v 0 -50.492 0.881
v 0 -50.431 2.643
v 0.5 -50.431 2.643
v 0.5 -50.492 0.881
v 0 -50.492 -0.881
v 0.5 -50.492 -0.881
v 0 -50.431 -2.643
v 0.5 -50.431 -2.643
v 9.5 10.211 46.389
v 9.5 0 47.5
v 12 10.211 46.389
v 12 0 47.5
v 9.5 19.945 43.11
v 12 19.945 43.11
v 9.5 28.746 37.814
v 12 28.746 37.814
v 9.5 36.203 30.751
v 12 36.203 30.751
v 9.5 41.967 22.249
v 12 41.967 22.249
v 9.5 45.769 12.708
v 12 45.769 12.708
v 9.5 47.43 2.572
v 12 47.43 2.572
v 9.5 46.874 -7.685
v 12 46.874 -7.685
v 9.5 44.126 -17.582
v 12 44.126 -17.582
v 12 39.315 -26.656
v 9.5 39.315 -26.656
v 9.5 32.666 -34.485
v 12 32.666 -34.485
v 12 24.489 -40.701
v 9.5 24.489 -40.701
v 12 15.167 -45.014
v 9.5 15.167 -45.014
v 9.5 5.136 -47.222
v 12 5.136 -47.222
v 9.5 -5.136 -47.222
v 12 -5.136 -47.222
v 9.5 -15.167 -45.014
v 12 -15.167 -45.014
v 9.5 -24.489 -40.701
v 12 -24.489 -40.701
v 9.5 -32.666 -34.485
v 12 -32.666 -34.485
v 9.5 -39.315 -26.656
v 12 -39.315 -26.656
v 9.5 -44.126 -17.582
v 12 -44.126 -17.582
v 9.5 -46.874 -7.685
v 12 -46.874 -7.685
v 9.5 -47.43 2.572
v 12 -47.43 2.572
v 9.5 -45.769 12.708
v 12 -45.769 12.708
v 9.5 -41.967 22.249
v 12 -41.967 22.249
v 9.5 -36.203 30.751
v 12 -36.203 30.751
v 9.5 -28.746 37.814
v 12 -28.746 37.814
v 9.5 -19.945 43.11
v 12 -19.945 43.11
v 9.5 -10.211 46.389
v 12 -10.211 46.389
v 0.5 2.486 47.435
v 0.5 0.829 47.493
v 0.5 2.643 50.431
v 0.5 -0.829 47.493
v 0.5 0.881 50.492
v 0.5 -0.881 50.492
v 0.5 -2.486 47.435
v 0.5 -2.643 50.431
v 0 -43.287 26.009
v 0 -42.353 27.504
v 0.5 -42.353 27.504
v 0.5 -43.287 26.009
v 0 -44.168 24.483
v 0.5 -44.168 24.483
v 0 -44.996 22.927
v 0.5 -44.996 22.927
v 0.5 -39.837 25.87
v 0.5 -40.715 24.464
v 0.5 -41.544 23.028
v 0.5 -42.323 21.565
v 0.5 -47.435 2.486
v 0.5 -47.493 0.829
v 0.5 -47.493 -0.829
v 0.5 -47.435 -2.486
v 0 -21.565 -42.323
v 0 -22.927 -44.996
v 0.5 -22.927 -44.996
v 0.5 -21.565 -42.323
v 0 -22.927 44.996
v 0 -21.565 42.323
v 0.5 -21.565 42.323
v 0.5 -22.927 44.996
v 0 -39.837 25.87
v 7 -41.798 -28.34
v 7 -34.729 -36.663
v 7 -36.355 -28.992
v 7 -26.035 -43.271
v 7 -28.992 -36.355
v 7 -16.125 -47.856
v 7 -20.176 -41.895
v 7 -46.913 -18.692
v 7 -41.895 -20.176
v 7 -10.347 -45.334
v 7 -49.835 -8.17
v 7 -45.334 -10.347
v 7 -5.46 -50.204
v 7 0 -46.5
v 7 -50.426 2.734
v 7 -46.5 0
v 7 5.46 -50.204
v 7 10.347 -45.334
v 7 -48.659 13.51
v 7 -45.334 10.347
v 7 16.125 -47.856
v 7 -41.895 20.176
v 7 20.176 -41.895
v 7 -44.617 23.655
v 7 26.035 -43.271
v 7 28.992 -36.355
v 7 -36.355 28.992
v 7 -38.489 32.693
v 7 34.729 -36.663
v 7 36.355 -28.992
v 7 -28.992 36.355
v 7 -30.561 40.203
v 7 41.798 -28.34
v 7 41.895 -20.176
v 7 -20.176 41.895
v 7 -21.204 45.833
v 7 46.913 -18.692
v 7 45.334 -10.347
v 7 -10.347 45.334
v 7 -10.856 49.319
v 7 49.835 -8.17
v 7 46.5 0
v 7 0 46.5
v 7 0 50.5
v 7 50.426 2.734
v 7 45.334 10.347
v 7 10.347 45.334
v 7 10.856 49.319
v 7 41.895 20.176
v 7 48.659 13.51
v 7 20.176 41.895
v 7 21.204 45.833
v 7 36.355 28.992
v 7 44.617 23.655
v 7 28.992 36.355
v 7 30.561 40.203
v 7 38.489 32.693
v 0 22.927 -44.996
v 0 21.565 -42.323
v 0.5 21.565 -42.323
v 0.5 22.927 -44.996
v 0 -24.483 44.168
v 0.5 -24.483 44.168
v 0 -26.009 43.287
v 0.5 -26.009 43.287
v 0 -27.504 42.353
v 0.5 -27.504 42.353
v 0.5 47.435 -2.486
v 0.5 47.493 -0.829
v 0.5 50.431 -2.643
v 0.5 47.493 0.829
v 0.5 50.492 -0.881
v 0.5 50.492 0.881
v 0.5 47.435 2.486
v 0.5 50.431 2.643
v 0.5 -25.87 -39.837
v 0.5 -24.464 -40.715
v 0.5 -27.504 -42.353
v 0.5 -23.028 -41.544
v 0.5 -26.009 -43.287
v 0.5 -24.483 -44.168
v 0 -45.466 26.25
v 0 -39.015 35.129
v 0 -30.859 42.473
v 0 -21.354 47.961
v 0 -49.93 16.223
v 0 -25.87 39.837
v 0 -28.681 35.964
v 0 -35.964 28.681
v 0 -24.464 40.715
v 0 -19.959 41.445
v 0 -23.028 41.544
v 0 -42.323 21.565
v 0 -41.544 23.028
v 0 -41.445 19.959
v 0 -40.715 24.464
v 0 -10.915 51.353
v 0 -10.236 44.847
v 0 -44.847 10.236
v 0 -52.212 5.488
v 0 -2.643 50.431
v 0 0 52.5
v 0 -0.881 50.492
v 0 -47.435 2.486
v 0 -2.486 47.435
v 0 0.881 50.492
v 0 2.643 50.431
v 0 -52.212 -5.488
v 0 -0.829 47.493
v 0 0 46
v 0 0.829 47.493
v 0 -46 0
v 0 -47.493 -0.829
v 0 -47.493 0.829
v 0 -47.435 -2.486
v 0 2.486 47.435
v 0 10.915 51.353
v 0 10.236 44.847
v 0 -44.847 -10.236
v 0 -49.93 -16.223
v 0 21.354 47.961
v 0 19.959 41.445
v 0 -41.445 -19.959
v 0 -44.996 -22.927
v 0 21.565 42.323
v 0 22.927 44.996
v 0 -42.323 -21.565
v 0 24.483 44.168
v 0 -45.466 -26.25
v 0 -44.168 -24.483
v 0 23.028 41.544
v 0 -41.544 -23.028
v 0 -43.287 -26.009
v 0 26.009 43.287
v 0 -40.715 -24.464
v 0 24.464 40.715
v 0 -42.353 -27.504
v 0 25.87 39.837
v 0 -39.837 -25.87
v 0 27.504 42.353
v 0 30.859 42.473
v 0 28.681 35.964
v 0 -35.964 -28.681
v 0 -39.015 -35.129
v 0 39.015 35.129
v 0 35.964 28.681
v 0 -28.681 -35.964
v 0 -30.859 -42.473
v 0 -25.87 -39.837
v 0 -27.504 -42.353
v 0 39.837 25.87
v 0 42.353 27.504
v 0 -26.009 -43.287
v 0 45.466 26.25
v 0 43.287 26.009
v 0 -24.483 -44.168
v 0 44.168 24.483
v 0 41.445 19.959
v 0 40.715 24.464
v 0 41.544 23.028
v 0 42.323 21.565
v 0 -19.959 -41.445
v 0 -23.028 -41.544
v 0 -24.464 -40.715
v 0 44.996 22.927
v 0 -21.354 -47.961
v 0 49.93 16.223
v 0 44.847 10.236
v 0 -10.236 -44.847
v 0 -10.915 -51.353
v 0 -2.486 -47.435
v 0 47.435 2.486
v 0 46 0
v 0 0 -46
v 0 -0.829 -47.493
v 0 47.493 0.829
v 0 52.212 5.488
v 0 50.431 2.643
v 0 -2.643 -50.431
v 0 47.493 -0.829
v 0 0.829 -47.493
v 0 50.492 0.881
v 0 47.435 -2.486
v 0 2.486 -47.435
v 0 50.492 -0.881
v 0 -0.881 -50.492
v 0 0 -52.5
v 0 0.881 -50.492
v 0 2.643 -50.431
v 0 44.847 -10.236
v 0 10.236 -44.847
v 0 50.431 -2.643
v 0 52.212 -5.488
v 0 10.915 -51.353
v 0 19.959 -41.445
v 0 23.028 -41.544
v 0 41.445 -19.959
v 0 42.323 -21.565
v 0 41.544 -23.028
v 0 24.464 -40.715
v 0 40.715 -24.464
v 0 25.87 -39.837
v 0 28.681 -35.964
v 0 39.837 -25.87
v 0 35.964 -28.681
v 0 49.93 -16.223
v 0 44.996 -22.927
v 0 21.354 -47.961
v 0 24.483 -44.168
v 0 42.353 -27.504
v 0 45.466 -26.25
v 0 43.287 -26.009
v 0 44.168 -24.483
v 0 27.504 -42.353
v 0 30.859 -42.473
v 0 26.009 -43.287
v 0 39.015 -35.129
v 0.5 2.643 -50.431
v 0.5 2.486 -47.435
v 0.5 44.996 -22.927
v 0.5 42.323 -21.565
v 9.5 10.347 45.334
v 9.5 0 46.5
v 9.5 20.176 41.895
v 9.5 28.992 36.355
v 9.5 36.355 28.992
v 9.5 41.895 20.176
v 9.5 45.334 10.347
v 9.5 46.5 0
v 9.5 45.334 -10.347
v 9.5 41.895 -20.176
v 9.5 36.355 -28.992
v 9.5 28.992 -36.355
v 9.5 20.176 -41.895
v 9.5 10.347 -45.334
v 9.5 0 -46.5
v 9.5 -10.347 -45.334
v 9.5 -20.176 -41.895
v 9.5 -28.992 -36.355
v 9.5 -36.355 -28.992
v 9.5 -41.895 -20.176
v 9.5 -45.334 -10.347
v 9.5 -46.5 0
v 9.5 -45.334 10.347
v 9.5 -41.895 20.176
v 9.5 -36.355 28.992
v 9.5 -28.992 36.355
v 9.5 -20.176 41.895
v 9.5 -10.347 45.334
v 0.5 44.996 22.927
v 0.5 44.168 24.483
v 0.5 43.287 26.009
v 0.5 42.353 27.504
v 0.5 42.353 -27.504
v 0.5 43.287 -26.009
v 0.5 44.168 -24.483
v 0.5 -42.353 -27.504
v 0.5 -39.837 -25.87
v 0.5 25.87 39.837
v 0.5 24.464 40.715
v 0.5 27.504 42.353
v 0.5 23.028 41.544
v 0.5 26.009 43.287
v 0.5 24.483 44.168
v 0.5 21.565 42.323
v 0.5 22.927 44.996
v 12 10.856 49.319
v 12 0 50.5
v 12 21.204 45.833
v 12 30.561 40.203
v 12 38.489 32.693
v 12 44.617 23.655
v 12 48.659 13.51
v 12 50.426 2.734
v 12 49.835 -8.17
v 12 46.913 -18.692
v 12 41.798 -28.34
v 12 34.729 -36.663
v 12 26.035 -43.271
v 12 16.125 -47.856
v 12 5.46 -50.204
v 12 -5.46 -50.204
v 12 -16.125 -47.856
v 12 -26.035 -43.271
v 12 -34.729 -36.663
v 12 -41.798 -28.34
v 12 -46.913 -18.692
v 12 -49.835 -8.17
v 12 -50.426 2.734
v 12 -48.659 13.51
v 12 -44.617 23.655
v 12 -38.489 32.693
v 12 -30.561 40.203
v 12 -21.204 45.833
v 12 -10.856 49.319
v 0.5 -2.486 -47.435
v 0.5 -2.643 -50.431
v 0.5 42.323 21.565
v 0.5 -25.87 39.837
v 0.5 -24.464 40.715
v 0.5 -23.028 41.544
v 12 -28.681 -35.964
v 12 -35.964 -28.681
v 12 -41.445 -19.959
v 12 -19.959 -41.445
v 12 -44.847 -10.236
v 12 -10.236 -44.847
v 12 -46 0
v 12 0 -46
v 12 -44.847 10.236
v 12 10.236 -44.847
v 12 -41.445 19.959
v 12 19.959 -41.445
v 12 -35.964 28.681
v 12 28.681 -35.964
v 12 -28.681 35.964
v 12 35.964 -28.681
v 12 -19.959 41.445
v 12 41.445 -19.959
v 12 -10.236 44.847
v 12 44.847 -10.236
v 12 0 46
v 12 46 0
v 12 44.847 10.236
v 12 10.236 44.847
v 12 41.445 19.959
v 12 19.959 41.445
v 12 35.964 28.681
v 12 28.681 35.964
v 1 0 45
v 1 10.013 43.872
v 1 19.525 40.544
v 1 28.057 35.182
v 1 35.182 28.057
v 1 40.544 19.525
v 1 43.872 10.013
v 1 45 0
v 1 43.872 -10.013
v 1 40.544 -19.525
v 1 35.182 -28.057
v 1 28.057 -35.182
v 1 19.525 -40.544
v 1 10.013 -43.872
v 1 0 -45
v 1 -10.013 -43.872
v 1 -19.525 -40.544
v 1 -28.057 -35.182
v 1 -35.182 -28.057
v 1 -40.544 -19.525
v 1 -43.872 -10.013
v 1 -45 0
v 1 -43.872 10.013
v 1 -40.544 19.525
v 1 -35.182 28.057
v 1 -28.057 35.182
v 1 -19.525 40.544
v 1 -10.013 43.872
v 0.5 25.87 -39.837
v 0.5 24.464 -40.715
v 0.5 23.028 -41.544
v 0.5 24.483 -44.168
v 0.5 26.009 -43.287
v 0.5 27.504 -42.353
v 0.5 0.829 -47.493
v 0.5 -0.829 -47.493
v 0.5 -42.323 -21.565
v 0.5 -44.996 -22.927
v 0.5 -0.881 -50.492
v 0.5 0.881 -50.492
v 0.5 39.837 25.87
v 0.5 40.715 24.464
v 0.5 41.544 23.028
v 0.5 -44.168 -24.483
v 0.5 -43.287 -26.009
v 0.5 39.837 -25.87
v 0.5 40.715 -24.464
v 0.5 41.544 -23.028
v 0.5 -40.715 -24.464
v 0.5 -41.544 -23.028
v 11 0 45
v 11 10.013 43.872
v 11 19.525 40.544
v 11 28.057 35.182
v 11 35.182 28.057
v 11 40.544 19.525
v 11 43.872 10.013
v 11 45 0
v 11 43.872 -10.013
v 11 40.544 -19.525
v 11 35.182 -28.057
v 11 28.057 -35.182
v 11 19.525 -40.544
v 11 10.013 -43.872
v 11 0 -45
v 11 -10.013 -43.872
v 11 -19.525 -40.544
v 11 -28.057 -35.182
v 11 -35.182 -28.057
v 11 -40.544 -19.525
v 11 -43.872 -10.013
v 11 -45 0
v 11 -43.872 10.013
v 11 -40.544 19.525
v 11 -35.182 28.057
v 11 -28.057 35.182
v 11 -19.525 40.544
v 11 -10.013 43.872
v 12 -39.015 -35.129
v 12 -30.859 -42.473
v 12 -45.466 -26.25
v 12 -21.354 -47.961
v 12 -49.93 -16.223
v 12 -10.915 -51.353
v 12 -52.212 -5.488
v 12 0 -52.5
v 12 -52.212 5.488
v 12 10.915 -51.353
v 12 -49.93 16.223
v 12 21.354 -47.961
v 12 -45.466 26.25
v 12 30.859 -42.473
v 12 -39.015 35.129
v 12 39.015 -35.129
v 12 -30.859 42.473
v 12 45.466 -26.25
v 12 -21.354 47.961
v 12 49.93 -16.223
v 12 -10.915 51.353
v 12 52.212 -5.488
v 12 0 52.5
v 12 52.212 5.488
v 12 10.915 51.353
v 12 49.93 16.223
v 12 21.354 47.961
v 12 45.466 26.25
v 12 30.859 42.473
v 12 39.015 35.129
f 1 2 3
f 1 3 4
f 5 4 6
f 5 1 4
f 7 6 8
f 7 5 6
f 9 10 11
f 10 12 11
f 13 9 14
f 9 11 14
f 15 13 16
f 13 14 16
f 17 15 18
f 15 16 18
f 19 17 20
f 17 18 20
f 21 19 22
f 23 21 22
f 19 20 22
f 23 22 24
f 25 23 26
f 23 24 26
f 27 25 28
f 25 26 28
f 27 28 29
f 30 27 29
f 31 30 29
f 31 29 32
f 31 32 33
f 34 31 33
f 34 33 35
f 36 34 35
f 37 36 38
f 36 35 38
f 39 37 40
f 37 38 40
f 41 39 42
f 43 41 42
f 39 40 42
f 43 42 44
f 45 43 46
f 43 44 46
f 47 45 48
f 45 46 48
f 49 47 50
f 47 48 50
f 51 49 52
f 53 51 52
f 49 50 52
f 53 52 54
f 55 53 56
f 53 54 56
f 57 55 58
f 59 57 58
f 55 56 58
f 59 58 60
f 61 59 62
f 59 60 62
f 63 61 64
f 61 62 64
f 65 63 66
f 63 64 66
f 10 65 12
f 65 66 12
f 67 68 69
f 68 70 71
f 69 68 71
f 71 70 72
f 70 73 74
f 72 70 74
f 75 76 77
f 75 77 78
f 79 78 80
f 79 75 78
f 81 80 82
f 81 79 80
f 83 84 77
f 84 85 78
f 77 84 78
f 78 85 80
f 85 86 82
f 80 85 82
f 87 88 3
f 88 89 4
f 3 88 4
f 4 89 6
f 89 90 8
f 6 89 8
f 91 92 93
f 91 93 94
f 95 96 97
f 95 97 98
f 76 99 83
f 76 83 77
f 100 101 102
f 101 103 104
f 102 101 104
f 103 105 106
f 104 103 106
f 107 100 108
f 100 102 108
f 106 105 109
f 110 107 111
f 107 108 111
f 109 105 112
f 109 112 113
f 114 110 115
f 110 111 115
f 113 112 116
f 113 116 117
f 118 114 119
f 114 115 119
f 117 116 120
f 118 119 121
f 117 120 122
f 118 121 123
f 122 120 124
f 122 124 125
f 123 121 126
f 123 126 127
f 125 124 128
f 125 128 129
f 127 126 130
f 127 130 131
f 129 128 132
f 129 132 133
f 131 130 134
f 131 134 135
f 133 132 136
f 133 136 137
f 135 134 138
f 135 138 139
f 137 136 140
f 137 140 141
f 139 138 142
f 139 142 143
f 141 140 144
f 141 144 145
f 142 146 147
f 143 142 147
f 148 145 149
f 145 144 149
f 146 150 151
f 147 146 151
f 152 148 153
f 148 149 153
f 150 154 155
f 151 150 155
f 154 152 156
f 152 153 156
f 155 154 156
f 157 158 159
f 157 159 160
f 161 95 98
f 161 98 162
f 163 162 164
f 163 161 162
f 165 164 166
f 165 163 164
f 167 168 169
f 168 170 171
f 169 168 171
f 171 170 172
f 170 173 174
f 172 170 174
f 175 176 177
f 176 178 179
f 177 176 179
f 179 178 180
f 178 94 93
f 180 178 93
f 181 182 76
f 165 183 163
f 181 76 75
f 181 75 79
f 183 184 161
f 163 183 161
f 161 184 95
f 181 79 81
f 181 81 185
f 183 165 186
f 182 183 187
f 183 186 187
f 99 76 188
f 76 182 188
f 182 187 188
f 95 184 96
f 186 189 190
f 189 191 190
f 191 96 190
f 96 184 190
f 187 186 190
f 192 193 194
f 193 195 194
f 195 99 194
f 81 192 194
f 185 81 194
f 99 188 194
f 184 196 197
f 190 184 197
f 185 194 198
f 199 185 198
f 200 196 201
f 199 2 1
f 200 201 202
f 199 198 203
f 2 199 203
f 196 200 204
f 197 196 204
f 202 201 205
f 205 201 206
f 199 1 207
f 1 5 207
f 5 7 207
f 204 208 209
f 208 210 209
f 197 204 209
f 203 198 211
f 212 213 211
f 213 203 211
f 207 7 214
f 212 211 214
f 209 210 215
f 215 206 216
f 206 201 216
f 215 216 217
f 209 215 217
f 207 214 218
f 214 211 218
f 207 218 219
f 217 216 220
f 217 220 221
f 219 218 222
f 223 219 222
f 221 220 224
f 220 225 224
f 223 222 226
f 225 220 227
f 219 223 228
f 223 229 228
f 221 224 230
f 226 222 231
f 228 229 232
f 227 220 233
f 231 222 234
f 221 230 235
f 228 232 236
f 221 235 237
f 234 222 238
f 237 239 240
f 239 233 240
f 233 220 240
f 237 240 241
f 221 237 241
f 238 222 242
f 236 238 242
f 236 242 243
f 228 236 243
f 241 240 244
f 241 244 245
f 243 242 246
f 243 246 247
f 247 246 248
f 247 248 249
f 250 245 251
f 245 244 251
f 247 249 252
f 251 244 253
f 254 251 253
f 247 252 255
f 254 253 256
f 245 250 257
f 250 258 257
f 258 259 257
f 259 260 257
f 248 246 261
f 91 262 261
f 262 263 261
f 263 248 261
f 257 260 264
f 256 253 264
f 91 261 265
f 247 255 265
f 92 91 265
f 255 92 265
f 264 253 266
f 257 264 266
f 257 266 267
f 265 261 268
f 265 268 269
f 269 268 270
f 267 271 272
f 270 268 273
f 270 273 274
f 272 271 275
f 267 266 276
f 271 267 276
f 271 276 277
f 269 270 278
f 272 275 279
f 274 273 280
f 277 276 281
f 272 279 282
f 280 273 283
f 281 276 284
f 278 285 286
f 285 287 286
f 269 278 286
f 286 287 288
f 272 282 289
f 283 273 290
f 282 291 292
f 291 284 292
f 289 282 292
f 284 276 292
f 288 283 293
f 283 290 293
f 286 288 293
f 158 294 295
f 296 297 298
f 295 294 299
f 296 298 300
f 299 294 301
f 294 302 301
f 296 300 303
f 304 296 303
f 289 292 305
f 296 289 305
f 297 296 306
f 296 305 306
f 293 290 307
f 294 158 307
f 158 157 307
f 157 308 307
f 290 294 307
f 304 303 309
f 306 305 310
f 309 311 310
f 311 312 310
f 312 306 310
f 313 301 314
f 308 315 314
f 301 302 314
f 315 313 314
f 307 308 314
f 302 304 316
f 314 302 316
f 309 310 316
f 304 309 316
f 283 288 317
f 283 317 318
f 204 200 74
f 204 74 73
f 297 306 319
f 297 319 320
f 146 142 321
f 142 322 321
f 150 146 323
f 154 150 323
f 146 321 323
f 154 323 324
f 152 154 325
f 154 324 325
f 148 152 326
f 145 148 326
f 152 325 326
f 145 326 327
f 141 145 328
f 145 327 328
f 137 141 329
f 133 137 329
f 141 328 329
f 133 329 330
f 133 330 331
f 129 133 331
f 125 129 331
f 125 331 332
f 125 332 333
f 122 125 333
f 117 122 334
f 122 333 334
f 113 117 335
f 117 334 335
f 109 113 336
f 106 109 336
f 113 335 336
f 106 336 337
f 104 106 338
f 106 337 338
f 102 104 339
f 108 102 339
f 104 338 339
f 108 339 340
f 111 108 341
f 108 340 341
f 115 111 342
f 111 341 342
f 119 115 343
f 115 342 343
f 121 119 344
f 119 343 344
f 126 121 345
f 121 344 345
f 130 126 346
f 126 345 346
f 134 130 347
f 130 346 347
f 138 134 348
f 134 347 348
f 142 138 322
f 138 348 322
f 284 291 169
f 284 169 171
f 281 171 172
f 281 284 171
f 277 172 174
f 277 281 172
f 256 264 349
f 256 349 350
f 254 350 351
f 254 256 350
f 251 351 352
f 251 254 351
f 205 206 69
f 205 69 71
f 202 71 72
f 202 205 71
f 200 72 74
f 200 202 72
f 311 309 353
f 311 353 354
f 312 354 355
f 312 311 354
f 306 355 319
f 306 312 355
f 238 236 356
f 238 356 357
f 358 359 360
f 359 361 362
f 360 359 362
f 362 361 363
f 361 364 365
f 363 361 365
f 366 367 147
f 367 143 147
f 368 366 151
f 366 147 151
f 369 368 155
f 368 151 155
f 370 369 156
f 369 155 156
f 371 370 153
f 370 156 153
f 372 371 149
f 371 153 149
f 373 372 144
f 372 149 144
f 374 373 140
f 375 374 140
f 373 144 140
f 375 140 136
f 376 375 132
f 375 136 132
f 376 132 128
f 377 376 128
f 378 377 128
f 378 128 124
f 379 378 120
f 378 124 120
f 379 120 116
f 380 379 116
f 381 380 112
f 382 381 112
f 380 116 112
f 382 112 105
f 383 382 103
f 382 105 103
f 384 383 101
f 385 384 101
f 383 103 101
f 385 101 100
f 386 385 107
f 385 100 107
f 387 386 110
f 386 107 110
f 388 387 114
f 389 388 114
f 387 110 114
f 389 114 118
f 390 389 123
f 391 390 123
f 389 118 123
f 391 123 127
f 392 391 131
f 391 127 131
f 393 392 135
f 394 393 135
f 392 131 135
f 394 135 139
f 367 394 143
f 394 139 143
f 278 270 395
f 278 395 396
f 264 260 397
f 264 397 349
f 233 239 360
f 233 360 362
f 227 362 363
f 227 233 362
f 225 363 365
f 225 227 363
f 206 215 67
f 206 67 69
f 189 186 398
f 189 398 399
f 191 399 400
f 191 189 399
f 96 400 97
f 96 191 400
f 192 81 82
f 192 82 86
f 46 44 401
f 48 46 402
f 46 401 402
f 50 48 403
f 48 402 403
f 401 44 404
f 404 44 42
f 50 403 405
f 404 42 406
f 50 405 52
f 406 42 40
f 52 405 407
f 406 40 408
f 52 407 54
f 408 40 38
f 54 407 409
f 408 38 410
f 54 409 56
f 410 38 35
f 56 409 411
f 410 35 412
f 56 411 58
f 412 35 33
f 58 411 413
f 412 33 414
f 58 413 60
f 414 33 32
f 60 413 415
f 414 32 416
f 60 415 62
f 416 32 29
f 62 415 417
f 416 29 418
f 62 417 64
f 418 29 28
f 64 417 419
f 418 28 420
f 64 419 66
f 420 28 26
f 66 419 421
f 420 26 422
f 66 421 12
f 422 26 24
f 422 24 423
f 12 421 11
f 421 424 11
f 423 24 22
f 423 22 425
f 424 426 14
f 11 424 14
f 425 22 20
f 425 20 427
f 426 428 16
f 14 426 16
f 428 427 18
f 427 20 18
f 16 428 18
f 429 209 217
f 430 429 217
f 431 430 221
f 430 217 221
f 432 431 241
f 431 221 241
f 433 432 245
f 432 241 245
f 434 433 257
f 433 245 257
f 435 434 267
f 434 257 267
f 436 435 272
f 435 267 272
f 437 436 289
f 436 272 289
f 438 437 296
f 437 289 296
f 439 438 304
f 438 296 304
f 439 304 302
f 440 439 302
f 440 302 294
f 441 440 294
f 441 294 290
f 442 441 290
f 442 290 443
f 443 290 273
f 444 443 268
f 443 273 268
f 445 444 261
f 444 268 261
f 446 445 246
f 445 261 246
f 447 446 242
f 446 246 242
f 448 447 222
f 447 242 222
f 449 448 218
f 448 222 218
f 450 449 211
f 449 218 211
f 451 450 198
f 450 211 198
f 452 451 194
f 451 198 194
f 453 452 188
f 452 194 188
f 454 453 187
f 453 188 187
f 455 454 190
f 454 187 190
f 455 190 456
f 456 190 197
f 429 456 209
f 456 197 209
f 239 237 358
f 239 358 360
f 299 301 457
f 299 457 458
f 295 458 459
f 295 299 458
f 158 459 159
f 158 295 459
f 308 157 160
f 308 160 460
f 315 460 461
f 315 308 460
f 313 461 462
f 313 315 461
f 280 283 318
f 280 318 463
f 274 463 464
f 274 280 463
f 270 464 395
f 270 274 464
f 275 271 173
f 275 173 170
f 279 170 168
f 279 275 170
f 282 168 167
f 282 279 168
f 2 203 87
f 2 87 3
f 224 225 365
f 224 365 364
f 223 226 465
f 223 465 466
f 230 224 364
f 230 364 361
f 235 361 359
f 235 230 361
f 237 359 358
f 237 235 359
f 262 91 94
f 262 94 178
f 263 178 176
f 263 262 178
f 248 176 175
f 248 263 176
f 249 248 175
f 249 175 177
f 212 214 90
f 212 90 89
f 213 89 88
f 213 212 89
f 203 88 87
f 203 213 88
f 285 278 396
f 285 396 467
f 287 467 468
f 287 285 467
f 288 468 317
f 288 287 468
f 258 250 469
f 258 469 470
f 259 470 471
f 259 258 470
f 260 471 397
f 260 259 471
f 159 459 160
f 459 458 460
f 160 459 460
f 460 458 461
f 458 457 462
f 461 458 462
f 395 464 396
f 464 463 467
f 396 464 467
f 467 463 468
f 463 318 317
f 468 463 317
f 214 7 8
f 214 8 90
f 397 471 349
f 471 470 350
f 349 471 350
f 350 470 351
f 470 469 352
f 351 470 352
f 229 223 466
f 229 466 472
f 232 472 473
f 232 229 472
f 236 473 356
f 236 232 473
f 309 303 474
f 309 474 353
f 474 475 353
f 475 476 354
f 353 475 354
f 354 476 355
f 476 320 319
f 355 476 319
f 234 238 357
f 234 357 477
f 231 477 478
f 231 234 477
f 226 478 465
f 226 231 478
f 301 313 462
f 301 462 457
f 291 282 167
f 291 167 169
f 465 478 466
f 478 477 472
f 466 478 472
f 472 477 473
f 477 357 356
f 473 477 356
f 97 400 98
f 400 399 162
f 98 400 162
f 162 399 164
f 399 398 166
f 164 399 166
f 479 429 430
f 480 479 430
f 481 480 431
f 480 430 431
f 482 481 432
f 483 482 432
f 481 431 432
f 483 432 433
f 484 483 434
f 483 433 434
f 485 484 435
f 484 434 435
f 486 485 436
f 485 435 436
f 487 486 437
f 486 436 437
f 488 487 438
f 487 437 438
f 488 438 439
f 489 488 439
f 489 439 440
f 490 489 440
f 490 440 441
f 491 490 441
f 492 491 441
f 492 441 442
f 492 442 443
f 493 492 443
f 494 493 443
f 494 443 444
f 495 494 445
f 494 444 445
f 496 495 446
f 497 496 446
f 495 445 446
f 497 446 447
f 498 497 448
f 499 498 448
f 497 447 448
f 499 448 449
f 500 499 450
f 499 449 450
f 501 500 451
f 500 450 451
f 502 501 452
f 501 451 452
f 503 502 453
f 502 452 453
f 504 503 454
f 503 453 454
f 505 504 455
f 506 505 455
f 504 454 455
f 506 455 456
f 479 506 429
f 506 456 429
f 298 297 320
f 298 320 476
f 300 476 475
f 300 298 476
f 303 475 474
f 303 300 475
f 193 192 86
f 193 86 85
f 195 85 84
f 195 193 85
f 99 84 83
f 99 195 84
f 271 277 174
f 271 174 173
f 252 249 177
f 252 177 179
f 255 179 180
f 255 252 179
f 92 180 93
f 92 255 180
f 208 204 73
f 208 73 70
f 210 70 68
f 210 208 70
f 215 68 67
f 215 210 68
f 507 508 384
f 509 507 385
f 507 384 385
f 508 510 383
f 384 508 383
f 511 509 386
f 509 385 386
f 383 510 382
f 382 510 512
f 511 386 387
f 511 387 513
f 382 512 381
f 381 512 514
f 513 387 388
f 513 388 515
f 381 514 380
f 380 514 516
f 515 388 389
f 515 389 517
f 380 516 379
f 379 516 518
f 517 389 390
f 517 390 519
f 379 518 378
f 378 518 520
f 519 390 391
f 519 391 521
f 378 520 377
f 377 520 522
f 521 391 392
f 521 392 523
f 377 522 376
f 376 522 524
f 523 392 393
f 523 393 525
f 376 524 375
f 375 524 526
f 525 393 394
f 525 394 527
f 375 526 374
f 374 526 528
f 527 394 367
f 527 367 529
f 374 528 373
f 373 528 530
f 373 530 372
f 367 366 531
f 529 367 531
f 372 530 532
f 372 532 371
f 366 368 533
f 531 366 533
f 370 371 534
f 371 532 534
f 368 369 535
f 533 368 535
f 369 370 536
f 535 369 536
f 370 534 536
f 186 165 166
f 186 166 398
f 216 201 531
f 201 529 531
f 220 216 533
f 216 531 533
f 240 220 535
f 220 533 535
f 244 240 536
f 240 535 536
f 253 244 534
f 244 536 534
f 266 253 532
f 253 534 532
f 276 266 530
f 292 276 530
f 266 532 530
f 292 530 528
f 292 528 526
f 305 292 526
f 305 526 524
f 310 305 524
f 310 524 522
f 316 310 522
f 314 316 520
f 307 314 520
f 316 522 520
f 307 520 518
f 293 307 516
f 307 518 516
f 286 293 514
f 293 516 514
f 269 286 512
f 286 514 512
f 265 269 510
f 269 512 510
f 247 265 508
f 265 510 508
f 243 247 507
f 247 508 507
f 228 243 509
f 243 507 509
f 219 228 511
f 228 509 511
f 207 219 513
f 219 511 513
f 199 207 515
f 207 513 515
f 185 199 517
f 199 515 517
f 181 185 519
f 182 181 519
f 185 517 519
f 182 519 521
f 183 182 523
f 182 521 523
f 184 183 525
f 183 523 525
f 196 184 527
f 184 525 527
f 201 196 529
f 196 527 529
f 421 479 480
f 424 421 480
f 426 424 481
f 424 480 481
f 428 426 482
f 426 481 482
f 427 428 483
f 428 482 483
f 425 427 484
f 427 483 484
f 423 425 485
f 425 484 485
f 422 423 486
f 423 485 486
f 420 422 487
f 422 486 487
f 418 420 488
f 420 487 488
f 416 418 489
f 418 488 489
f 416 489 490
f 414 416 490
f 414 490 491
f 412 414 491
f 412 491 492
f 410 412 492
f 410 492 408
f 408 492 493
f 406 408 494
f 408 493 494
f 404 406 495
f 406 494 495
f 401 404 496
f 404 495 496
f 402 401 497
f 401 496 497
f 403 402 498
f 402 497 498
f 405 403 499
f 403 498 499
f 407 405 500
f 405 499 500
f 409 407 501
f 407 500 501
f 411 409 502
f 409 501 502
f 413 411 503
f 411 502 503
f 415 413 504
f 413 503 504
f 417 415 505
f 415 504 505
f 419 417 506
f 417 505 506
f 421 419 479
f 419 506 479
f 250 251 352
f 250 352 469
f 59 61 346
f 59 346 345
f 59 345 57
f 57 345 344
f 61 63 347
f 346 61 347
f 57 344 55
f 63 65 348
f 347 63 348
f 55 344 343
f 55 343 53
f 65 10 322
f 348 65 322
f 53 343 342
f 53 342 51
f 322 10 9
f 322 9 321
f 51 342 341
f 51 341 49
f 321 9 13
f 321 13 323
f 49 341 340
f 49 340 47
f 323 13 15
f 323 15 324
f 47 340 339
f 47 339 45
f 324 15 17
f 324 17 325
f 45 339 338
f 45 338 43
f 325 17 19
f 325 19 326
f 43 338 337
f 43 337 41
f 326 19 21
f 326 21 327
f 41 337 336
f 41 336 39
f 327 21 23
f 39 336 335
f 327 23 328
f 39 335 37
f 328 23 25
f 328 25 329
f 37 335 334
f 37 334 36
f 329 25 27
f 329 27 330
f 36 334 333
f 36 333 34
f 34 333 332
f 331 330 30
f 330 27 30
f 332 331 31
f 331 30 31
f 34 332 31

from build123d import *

# Parameters (mm, degrees)
CUT_EXTRUDE_1_DEPTH      = 0.5
PATTERN_CIRCULAR_1_COUNT = 12
CHAMFER_1_SIZE           = 1


with BuildPart() as part:
    # 草图1 → 旋转1 (revolve)
    with BuildSketch(Plane(origin=(0, 0, 0), x_dir=(-1, 0, 0), z_dir=(0, 0, -1)), mode=Mode.PRIVATE) as revolve_1_sk:
        Polygon((-7, 46.5), (-9.5, 46.5), (-9.5, 47.5), (-12, 47.5), (-12, 45), (0, 45), (0, 52.5), (-12, 52.5), (-12, 50.5), (-7, 50.5), align=None)
    revolve(revolve_1_sk.sketch.rotate(Axis((17.910447761, 0, 0), (-1, 0, 0)), 270), axis=Axis((17.910447761, 0, 0), (-1, 0, 0)))

    # 草图2 → 切除-拉伸1 (cut)
    with BuildSketch(Plane.ZY):
        with BuildLine():
            Line((-47.434902901, -2.485957922), (-50.430791505, -2.64296579))
            ThreePointArc((-50.430791505, -2.64296579), (-50.5, 0), (-50.430791505, 2.64296579))
            Line((-50.430791505, 2.64296579), (-47.434902901, 2.485957922))
            ThreePointArc((-47.434902901, 2.485957922), (-47.5, 0), (-47.434902901, -2.485957922))
        make_face()
    cut_extrude_1 = extrude(amount=-CUT_EXTRUDE_1_DEPTH, mode=Mode.SUBTRACT)

    # 阵列(圆周)1: 切除-拉伸1 ×12 about axis
    pattern_circular_1_axis = Axis((0, 0, 0), (1, 0, 0))
    for i in range(1, PATTERN_CIRCULAR_1_COUNT):
        add(cut_extrude_1.rotate(pattern_circular_1_axis, i * 360 / PATTERN_CIRCULAR_1_COUNT), mode=Mode.SUBTRACT)

    # 倒角1
    chamfer_1_edges = [part.edges().sort_by_distance(p)[0] for p in [
        (0, 0, -45),
        (12, 0, -45),
    ]]
    chamfer(chamfer_1_edges, length=CHAMFER_1_SIZE)


solid = part.part
